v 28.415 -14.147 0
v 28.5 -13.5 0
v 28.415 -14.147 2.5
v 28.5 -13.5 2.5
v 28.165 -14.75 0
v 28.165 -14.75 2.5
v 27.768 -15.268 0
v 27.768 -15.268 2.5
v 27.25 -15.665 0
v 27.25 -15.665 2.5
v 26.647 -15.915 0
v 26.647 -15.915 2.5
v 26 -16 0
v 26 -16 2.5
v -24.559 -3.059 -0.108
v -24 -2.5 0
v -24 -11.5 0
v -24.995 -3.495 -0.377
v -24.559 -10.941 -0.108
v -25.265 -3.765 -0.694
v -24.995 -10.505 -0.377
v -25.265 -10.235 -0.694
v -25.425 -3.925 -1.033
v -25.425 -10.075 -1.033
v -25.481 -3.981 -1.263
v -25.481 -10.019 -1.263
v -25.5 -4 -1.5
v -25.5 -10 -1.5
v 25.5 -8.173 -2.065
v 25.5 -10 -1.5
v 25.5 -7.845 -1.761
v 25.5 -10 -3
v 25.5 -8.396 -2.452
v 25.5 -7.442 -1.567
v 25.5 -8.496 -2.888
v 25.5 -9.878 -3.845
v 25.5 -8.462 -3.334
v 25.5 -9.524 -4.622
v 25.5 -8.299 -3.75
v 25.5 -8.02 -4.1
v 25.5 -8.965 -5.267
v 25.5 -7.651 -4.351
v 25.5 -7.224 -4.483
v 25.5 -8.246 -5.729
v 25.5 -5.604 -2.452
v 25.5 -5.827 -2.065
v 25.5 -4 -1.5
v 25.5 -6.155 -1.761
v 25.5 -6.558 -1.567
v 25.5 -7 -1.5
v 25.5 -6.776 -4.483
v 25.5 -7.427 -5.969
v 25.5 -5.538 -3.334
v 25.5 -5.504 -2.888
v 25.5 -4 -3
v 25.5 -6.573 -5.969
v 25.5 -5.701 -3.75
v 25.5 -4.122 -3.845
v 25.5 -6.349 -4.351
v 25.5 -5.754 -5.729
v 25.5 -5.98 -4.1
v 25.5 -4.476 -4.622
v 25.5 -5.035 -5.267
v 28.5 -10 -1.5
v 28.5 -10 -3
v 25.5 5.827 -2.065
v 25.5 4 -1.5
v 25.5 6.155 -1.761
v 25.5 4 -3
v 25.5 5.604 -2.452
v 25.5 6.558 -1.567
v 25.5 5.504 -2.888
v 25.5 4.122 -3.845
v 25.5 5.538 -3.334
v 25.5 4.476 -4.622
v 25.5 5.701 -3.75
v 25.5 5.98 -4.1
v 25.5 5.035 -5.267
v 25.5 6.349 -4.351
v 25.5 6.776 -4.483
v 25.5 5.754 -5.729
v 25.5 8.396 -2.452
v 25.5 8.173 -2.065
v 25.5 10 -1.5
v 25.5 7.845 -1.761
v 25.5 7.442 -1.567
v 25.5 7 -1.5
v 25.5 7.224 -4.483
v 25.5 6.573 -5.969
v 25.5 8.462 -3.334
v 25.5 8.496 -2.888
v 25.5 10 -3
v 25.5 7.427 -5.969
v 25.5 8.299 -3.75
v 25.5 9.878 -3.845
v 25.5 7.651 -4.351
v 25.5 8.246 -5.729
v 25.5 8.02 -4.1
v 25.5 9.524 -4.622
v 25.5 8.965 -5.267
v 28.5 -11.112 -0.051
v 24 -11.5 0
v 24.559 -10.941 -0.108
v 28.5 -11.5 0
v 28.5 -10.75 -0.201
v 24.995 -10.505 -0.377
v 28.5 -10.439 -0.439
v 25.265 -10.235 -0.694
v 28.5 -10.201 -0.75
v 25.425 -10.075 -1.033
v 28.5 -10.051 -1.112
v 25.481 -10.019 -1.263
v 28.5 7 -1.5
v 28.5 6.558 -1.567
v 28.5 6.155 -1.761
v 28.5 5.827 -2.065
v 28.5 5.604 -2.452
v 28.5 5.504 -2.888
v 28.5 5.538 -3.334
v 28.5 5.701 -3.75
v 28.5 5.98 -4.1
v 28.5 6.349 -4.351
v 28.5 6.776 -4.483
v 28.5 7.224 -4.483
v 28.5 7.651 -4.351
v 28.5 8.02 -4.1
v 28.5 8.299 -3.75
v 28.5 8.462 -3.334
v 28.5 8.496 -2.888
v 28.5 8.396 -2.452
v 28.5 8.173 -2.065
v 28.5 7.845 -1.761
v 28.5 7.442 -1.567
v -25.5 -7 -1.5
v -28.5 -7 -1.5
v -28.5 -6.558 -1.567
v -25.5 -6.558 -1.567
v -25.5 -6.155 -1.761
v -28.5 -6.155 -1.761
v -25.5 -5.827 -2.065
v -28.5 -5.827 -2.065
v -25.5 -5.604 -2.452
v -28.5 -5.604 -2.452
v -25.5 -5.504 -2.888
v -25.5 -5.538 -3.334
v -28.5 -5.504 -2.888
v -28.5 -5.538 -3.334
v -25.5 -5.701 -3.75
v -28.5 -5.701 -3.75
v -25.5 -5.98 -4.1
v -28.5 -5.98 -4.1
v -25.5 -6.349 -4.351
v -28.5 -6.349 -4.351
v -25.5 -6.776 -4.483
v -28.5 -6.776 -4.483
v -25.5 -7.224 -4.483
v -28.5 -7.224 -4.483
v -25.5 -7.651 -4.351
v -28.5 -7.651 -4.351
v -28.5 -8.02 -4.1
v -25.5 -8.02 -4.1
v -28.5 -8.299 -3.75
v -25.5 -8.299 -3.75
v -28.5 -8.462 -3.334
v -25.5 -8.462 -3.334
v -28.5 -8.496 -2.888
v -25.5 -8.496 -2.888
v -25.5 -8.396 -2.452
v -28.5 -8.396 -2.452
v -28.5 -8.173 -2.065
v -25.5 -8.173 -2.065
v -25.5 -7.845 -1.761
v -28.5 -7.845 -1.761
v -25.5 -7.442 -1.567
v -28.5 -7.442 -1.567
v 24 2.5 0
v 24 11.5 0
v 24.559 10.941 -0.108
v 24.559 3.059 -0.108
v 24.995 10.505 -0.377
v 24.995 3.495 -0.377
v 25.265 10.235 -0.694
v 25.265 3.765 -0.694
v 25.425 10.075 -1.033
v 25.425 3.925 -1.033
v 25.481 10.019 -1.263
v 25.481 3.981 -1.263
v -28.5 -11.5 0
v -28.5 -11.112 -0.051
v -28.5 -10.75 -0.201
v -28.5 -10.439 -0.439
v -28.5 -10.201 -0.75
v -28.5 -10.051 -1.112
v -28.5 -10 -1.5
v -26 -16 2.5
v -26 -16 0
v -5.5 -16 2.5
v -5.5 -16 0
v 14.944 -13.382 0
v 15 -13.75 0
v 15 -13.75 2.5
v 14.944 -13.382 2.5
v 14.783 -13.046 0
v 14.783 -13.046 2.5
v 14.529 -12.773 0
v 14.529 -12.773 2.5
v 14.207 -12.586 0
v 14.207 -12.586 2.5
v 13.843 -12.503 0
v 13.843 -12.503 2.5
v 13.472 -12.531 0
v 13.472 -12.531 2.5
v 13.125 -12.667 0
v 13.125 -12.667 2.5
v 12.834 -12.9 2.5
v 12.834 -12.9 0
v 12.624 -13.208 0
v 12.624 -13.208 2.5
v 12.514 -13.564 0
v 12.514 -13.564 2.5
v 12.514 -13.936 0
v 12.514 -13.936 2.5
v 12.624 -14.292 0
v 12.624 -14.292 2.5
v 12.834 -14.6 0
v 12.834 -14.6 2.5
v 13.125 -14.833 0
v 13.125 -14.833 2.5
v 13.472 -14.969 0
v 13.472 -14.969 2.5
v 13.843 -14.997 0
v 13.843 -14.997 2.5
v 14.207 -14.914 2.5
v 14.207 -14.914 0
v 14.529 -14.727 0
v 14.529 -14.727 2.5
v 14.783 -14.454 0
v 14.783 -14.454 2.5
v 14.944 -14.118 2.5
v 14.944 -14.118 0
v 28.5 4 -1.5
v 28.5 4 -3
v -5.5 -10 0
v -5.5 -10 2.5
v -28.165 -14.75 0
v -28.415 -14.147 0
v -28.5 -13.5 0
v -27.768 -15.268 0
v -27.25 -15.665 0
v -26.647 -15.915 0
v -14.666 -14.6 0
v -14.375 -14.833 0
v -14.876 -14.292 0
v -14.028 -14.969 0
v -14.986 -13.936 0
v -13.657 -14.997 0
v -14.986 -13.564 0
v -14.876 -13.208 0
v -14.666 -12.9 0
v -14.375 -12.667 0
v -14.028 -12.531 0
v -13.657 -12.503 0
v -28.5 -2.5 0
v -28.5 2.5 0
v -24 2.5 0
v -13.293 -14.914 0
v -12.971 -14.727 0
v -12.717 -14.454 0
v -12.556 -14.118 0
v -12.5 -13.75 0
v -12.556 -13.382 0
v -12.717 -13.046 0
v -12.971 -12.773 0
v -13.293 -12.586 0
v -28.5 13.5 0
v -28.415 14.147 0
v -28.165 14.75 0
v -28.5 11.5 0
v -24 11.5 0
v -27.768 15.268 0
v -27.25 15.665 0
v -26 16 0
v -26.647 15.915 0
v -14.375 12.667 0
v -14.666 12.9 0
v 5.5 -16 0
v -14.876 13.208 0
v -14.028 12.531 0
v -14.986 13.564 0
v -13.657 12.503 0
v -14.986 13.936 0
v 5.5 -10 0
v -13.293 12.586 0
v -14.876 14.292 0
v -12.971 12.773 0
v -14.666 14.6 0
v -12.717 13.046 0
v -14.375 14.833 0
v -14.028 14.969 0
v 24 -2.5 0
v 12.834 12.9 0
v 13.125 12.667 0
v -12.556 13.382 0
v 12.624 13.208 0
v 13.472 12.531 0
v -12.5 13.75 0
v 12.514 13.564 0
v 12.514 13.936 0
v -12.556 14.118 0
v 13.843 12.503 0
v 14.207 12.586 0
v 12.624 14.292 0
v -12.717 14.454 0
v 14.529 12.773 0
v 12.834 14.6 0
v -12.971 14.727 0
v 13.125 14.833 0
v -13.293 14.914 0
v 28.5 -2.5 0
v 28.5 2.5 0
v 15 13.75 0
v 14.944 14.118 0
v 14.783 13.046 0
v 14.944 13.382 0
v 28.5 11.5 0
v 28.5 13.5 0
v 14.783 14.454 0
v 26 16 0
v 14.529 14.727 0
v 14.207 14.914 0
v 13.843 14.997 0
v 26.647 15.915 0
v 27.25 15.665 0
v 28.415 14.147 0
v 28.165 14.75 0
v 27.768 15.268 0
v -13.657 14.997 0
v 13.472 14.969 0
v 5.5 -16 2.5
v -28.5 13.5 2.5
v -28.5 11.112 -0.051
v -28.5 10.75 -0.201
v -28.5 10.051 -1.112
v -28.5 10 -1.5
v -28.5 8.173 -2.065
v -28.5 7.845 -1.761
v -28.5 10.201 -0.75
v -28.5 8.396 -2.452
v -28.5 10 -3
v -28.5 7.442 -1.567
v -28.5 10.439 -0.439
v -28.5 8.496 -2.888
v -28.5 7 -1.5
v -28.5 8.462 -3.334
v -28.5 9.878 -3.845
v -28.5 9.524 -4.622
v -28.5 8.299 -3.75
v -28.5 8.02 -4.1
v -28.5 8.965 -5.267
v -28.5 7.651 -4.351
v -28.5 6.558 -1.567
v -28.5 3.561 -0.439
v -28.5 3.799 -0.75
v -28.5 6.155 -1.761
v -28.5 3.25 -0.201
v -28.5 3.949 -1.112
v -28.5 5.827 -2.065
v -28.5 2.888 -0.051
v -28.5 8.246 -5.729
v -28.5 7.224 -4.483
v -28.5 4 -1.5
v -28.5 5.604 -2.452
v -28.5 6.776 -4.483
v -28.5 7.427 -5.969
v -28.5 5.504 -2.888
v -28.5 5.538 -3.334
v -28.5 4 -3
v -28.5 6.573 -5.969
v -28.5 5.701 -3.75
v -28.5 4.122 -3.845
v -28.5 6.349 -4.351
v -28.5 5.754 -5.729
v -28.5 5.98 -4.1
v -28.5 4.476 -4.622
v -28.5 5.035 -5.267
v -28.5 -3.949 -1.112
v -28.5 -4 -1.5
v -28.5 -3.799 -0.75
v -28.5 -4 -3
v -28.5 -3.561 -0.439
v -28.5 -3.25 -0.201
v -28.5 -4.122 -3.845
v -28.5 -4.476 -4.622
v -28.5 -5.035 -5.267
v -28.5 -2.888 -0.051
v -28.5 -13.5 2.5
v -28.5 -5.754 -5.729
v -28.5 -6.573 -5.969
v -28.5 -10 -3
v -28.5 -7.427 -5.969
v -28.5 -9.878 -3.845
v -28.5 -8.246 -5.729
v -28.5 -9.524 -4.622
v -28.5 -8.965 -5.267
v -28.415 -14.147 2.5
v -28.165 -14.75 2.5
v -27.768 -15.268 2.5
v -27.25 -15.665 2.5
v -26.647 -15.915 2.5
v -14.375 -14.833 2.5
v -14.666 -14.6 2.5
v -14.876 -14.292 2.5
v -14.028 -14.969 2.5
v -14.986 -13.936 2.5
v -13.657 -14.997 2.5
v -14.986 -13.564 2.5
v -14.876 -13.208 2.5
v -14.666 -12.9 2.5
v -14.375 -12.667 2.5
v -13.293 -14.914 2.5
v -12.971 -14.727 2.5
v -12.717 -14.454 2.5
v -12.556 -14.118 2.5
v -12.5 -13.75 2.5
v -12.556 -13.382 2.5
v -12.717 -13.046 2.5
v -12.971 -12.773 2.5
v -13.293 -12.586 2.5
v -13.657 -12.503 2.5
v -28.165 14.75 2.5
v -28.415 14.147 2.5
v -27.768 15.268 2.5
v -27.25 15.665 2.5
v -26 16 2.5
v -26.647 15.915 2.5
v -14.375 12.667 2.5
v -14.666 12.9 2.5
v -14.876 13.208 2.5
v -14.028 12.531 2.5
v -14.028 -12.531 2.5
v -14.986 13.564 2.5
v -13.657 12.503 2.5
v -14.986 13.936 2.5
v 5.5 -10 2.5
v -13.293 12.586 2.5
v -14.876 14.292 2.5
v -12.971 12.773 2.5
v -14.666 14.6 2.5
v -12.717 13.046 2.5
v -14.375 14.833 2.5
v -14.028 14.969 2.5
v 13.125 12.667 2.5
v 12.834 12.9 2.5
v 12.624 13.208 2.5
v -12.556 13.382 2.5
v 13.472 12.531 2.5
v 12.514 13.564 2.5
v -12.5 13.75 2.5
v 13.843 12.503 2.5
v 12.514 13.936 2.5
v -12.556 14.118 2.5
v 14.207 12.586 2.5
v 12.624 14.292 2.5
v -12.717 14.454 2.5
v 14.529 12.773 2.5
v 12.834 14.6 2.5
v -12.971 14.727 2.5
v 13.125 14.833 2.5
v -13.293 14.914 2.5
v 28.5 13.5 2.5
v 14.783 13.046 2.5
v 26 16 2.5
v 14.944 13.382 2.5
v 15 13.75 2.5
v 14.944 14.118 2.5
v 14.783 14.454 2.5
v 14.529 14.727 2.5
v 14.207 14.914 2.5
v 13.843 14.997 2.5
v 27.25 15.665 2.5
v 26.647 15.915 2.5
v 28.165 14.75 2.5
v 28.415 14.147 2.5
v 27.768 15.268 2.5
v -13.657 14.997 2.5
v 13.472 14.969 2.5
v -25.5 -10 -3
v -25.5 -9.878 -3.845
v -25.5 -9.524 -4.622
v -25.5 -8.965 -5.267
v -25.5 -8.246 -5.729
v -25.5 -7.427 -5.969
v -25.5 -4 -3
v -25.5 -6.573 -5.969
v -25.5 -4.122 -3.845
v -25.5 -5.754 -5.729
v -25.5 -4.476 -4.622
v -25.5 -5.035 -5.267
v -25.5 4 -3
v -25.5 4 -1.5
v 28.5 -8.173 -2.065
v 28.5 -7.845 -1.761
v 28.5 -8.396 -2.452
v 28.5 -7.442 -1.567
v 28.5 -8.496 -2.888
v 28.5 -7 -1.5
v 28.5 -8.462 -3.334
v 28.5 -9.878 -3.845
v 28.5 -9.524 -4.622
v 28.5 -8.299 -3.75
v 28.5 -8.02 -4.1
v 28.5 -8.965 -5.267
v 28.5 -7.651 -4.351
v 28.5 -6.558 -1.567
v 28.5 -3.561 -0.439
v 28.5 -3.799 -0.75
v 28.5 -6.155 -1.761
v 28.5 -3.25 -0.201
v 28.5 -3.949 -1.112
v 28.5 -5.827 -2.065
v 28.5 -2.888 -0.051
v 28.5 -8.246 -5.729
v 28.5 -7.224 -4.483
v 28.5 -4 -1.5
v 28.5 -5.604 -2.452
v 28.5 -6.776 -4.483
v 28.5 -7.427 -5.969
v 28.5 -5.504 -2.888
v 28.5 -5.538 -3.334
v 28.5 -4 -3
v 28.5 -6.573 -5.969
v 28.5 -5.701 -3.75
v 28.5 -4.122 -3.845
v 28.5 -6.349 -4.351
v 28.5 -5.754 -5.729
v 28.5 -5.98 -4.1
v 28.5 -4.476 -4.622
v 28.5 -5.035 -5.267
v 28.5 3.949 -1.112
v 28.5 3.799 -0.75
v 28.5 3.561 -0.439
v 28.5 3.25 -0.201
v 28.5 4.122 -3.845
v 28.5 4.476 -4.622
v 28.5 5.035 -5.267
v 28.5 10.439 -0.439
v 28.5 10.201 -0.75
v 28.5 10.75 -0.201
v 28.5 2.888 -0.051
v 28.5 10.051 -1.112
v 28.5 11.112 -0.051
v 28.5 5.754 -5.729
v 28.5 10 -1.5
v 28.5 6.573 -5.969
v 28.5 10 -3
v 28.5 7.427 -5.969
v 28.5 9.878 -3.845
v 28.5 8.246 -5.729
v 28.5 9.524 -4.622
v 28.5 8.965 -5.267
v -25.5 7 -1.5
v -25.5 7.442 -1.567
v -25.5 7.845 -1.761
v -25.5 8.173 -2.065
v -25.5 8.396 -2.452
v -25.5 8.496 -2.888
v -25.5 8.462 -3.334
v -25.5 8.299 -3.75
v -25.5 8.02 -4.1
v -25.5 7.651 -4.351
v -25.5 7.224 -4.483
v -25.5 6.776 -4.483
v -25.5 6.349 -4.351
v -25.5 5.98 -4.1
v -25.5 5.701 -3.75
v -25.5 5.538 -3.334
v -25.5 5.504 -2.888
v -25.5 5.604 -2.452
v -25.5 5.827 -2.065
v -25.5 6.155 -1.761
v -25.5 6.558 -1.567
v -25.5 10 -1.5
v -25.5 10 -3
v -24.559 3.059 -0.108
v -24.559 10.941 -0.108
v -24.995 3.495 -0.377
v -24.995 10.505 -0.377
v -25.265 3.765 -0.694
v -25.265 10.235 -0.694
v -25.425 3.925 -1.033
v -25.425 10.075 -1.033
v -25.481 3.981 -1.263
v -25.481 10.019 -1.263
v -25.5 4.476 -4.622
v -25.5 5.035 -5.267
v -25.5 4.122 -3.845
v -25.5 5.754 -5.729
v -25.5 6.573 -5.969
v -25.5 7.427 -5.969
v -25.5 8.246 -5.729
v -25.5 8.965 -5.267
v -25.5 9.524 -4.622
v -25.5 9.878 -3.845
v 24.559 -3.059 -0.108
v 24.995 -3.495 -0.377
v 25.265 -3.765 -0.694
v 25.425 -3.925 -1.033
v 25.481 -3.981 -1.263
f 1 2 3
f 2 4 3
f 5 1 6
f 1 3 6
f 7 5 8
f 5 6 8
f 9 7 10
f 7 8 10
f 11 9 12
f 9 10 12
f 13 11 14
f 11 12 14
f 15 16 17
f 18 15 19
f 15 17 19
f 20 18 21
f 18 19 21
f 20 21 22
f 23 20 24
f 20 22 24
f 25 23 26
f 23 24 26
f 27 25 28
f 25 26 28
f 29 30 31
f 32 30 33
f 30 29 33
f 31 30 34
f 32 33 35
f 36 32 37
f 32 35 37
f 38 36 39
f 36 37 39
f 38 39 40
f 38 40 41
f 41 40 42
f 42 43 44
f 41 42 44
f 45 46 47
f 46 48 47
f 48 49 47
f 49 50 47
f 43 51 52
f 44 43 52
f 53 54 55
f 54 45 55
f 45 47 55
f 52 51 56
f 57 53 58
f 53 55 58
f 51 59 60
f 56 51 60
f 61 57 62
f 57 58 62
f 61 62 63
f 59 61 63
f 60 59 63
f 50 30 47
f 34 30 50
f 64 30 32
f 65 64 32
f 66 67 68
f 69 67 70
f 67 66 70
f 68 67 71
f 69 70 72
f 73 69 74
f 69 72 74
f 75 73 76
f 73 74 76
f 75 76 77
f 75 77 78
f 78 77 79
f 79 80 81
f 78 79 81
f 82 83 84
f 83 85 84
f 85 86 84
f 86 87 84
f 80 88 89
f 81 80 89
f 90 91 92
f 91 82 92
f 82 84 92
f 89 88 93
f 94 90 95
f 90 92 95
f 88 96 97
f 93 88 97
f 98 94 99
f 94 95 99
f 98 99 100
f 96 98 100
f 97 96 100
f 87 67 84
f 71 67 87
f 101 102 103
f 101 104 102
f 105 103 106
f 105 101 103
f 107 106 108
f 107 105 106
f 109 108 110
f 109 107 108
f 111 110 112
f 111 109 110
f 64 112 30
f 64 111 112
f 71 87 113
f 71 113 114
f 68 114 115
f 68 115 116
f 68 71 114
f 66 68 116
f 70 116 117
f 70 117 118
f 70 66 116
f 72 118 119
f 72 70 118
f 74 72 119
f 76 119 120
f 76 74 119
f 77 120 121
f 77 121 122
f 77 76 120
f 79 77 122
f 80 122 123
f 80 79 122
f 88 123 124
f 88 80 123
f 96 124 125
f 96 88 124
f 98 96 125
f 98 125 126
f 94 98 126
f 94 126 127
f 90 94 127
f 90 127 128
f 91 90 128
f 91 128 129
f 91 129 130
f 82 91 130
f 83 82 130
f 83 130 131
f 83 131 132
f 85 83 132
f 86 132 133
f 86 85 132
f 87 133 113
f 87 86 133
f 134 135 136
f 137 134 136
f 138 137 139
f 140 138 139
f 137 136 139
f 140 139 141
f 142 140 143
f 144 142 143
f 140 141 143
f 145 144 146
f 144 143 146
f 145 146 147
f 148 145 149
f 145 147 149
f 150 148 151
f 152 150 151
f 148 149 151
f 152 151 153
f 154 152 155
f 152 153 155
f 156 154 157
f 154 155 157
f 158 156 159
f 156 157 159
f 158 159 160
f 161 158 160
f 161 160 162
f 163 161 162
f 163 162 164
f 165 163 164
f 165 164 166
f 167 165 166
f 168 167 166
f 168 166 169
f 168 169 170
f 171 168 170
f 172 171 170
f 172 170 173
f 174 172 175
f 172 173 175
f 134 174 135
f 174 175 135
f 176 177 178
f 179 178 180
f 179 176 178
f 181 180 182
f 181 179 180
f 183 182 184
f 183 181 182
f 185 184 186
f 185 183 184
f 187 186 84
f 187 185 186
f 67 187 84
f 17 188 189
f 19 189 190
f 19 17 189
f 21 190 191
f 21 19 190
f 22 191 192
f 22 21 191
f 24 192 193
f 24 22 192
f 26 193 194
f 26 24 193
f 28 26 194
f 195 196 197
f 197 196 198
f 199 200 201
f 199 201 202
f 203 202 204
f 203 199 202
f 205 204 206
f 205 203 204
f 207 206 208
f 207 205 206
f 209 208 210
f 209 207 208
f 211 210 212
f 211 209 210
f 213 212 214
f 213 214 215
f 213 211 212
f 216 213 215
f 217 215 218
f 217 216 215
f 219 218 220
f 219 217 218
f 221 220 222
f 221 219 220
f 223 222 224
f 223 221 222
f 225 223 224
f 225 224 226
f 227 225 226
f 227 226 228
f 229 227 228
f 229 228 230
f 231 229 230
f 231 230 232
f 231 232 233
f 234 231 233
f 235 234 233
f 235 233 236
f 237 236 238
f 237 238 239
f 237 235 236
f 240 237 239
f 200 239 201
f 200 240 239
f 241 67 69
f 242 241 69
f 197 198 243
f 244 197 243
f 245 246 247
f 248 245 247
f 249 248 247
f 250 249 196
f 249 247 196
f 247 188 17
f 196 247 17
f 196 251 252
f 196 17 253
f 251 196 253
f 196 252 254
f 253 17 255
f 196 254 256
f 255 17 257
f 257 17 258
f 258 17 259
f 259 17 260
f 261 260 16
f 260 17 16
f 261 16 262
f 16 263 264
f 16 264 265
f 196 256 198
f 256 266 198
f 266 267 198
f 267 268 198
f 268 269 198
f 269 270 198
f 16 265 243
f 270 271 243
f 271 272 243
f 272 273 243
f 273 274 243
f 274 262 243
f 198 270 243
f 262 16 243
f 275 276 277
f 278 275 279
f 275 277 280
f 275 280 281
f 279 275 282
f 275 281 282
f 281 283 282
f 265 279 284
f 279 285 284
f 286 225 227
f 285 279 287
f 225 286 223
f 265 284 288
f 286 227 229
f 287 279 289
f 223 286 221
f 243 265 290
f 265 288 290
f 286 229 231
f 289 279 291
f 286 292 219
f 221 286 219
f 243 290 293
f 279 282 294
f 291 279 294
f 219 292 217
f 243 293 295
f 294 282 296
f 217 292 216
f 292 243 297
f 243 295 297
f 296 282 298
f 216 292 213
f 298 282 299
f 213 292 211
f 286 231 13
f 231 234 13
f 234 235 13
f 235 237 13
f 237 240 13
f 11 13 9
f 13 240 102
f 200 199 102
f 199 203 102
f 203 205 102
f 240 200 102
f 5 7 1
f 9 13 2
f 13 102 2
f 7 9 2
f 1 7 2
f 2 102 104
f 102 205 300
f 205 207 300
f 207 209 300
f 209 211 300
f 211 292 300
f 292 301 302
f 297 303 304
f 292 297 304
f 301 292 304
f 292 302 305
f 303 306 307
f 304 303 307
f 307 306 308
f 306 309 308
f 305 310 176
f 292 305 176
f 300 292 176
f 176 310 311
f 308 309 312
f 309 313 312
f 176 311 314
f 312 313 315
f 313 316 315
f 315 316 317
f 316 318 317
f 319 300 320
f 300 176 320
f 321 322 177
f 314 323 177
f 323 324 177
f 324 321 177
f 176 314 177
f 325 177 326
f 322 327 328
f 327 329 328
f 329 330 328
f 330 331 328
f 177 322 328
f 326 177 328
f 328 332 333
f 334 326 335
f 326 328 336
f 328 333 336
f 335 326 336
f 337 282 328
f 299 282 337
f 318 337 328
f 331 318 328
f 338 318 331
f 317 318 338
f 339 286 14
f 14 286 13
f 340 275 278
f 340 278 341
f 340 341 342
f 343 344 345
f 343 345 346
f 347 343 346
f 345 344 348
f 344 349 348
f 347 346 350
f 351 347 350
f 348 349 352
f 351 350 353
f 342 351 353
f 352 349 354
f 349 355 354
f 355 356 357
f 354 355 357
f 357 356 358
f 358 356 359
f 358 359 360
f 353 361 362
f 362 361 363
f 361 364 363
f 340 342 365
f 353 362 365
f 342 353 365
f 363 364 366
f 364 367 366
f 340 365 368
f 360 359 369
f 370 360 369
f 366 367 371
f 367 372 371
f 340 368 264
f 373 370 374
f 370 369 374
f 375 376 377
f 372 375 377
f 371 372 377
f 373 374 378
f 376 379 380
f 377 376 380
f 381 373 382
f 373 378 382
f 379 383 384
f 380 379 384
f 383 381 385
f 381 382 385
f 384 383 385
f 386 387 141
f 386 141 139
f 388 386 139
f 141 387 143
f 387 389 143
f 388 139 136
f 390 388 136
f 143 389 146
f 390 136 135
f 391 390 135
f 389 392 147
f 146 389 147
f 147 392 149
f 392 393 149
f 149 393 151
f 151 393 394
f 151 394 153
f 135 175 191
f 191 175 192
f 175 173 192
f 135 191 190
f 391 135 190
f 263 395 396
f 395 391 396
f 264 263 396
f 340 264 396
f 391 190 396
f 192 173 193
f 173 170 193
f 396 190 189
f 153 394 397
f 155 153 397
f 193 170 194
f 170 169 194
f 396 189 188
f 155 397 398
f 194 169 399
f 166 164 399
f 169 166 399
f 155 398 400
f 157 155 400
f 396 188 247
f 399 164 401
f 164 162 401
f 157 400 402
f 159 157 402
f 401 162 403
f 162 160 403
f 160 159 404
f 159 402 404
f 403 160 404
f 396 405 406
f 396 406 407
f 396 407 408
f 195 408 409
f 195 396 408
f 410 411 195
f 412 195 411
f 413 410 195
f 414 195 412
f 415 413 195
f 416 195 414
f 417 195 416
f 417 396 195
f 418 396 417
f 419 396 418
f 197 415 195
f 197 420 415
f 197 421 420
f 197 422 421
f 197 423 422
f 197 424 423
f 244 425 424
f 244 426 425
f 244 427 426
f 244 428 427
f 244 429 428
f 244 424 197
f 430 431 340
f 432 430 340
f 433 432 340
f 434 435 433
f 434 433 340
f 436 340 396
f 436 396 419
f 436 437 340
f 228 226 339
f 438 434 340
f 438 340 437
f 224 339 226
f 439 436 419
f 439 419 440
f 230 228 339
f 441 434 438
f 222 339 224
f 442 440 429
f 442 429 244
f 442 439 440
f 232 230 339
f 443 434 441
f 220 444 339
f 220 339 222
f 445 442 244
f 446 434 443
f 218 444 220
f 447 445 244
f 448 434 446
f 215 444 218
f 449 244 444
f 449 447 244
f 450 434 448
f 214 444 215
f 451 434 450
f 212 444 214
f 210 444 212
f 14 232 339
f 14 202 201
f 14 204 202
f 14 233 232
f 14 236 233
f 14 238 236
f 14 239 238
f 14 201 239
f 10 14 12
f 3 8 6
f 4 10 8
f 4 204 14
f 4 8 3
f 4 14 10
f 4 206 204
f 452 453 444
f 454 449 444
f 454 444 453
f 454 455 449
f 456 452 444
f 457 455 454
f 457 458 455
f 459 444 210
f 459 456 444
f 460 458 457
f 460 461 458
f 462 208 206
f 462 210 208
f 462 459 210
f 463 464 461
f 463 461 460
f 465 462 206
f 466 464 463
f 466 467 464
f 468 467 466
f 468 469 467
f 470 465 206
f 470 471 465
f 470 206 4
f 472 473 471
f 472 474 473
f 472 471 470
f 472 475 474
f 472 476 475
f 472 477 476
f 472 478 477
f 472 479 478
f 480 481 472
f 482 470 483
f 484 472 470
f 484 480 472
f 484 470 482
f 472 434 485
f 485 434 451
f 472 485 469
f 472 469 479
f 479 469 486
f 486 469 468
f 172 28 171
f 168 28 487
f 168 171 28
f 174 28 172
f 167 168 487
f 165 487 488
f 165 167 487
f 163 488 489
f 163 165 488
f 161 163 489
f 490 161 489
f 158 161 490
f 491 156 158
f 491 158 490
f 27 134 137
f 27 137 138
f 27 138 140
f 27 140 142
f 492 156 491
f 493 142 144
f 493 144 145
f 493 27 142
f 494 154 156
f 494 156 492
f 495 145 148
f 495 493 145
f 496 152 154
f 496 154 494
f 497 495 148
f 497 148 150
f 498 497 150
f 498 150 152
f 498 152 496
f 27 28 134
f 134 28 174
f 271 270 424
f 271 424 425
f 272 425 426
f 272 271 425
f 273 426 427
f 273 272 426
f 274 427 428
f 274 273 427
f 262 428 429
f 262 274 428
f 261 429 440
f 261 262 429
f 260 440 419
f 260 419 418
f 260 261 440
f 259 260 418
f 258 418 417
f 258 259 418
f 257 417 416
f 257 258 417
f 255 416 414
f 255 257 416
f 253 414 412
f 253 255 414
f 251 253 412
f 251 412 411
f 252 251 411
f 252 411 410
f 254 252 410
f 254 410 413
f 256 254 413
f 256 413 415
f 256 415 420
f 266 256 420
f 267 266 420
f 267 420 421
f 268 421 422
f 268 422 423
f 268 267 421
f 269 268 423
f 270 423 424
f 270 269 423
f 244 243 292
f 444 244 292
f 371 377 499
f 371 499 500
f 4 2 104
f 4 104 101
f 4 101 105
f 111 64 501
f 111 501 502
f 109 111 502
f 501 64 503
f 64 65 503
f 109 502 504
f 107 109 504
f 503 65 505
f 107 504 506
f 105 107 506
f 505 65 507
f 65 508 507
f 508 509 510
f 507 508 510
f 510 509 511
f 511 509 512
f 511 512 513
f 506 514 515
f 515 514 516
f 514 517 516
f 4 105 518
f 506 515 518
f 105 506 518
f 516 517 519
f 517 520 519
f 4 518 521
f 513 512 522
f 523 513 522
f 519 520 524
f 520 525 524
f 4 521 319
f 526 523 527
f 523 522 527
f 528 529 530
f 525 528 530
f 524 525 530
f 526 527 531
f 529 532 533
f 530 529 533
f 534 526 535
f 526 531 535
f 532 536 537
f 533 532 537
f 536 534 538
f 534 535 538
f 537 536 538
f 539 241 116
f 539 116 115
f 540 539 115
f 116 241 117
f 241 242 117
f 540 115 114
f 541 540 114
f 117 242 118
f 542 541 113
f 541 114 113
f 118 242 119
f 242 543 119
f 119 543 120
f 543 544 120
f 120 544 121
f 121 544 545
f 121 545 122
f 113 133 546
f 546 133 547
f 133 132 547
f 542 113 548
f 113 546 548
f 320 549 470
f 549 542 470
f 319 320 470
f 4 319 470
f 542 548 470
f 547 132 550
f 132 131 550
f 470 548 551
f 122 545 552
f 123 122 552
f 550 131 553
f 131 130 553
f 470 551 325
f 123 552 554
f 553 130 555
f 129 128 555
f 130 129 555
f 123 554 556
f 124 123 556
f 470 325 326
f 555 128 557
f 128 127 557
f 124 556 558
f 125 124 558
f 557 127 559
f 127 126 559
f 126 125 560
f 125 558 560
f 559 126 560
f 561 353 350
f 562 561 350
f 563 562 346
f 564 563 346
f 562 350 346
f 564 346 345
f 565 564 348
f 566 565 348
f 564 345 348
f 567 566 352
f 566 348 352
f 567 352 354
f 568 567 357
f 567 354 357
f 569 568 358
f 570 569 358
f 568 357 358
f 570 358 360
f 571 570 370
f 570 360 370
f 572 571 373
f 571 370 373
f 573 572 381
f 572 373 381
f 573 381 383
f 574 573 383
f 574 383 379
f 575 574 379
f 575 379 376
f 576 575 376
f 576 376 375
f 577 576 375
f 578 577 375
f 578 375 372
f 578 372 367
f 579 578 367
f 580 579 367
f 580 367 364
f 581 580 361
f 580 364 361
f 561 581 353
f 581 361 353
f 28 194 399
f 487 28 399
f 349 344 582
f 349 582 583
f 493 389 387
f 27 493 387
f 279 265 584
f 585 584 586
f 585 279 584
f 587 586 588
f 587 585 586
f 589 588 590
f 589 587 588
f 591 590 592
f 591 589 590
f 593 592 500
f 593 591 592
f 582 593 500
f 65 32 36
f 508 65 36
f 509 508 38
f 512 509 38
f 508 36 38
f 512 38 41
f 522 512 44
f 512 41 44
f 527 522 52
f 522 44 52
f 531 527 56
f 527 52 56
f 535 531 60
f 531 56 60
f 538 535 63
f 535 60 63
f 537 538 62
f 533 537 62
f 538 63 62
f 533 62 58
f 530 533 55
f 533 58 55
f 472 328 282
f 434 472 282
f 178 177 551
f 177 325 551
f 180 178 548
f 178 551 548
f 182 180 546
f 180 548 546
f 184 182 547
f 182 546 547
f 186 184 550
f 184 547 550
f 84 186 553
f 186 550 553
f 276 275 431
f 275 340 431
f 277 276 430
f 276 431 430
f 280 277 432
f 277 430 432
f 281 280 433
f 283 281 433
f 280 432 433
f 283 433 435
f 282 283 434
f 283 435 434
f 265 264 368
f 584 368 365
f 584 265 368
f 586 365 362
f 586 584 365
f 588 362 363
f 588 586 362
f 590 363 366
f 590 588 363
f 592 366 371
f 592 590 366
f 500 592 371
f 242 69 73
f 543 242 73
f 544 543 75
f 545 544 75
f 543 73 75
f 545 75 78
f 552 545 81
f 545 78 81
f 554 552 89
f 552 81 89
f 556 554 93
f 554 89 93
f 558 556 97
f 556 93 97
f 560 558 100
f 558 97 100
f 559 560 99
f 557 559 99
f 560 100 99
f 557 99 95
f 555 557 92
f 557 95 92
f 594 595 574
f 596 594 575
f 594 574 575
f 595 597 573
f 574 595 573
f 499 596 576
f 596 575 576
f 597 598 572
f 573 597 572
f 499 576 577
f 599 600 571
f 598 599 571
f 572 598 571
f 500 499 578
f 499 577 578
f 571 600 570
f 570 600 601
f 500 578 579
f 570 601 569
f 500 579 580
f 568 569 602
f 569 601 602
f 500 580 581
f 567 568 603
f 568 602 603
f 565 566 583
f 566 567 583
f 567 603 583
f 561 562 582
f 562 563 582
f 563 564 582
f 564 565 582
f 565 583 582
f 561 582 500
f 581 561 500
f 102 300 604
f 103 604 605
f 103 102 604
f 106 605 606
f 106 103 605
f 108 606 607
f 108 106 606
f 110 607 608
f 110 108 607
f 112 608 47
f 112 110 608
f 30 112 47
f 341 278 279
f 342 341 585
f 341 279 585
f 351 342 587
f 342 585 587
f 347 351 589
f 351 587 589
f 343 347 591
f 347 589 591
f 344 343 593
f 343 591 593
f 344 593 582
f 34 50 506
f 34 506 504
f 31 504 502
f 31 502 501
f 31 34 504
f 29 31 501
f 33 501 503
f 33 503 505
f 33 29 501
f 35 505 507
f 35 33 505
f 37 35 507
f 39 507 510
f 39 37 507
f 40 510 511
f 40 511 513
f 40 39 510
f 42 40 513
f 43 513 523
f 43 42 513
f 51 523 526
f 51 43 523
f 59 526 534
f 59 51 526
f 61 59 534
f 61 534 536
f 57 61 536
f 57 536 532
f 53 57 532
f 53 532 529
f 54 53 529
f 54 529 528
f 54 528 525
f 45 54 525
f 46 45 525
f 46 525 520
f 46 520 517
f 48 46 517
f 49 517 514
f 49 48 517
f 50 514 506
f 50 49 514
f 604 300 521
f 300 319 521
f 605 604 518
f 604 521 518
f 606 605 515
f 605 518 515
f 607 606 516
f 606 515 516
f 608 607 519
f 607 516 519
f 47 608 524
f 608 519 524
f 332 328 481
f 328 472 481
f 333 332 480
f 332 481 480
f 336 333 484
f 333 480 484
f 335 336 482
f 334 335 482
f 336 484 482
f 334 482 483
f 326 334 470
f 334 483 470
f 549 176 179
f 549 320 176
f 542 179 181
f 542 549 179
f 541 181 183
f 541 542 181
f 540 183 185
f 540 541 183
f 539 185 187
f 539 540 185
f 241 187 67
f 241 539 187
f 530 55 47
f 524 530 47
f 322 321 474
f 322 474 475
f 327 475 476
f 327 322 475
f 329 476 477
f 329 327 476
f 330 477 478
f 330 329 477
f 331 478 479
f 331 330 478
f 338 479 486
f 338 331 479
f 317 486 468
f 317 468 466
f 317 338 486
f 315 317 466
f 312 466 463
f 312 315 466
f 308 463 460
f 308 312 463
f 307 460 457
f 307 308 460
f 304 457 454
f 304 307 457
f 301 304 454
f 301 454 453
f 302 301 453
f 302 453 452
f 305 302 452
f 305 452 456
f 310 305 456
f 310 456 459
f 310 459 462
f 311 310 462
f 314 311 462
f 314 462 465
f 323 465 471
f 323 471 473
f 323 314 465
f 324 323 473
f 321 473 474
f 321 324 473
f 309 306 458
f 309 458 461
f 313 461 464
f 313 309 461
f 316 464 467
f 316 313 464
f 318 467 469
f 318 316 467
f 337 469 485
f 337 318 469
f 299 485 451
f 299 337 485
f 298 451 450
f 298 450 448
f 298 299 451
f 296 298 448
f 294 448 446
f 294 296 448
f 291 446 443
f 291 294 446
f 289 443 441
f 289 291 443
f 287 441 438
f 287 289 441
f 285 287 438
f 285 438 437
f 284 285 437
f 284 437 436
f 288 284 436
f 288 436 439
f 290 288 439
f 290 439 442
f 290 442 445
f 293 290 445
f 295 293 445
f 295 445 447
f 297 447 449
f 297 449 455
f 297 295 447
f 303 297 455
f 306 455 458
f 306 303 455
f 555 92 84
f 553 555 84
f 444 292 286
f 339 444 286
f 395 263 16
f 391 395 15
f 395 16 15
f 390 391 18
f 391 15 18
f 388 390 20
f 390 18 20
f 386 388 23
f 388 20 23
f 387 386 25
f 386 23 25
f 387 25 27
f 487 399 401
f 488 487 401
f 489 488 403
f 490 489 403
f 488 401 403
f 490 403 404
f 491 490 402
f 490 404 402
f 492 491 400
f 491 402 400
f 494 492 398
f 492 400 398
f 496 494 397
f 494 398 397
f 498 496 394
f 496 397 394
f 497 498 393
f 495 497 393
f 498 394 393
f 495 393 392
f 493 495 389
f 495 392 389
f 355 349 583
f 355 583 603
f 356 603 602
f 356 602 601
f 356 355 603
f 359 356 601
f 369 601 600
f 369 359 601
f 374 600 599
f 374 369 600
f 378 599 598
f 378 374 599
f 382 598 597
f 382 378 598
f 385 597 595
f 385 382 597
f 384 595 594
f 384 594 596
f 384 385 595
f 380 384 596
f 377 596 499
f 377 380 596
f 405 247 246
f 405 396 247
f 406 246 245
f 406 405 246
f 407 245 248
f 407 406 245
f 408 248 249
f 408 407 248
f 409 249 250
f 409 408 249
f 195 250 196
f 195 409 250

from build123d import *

# Parameters (mm, degrees)
SKETCH_1_R      = 1.25
EXTRUDE_1_DEPTH = 2.5
SKETCH_3_R      = 1.5
EXTRUDE_2_DEPTH = 3
EXTRUDE_START   = -3
SKETCH_4_R      = 1.5
EXTRUDE_3_DEPTH = 3
FILLET_1_R      = 1.5
FILLET_2_R      = 2.5


with BuildPart() as part:
    # 草图1 → 凸台-拉伸1 (new body)
    with BuildSketch(Plane.XY):
        Polygon((-28.5, -16), (-16, -16), (-5.5, -16), (-5.5, -10), (0, -10), (5.5, -10), (5.5, -16), (16, -16), (28.5, -16), (28.5, 16), (16, 16), (-16, 16), (-28.5, 16), align=None)
        with Locations((-13.75, -13.75)):
            Circle(SKETCH_1_R, mode=Mode.SUBTRACT)
        with Locations((13.75, -13.75)):
            Circle(SKETCH_1_R, mode=Mode.SUBTRACT)
        with Locations((-13.75, 13.75)):
            Circle(SKETCH_1_R, mode=Mode.SUBTRACT)
        with Locations((13.75, 13.75)):
            Circle(SKETCH_1_R, mode=Mode.SUBTRACT)
    extrude(amount=EXTRUDE_1_DEPTH)

    # 草图3 → 凸台-拉伸2 (add)
    # profile 1 of 2: a face of its own
    with BuildSketch(Plane.ZY.offset(28.5)):
        with BuildLine():
            Line((-3, 4), (0, 4))
            Line((0, 4), (0, 10))
            Line((0, 10), (-3, 10))
            ThreePointArc((-3, 10), (-6, 7), (-3, 4))
        make_face()
        with Locations((-3, 7)):
            Circle(SKETCH_3_R, mode=Mode.SUBTRACT)
    # profile 2 of 2: a face of its own
    with BuildSketch(Plane.ZY.offset(28.5)):
        with BuildLine():
            Line((-3, -4), (0, -4))
            Line((0, -4), (0, -10))
            Line((0, -10), (-3, -10))
            ThreePointArc((-3, -10), (-6, -7), (-3, -4))
        make_face()
        with Locations((-3, -7)):
            Circle(SKETCH_3_R, mode=Mode.SUBTRACT)
    extrude(amount=-EXTRUDE_2_DEPTH)

    # 草图4 → 凸台-拉伸3 (add)
    # profile 1 of 2: a face of its own
    with BuildSketch(Plane(origin=(28.5, 0, 0), x_dir=(0, 0, -1), z_dir=(1, 0, 0)).offset(EXTRUDE_START)):
        with BuildLine():
            Line((3, -4), (0, -4))
            Line((0, -4), (0, -10))
            Line((0, -10), (3, -10))
            ThreePointArc((3, -10), (6, -7), (3, -4))
        make_face()
        with Locations(Location((3, -7, 0), (0, 0, 180))):
            Circle(SKETCH_4_R, mode=Mode.SUBTRACT)
    # profile 2 of 2: a face of its own
    with BuildSketch(Plane(origin=(28.5, 0, 0), x_dir=(0, 0, -1), z_dir=(1, 0, 0)).offset(EXTRUDE_START)):
        with BuildLine():
            Line((3, 10), (0, 10))
            Line((0, 10), (0, 4))
            Line((0, 4), (3, 4))
            ThreePointArc((3, 4), (6, 7), (3, 10))
        make_face()
        with Locations(Location((3, 7, 0), (0, 0, 180))):
            Circle(SKETCH_4_R, mode=Mode.SUBTRACT)
    extrude(amount=EXTRUDE_3_DEPTH)

    # 圆角1
    fillet_1_edges = [part.edges().sort_by_distance(p)[0] for p in [
        (-25.5, 7, 0),
        (-27, 10, 0),
        (-27, 4, 0),
        (-25.5, -7, 0),
        (-27, -4, 0),
        (-27, -10, 0),
        (25.5, -7, 0),
        (27, -10, 0),
        (27, -4, 0),
        (25.5, 7, 0),
        (27, 4, 0),
        (27, 10, 0),
    ]]
    fillet(fillet_1_edges, radius=FILLET_1_R - 0.0001)  # a hair under: the kernel refuses the full size

    # 圆角2
    fillet_2_edges = [part.edges().sort_by_distance(p)[0] for p in [
        (-28.5, -16, 1.25),
        (-28.5, 16, 1.25),
        (28.5, 16, 1.25),
        (28.5, -16, 1.25),
    ]]
    fillet(fillet_2_edges, radius=FILLET_2_R)


solid = part.part
